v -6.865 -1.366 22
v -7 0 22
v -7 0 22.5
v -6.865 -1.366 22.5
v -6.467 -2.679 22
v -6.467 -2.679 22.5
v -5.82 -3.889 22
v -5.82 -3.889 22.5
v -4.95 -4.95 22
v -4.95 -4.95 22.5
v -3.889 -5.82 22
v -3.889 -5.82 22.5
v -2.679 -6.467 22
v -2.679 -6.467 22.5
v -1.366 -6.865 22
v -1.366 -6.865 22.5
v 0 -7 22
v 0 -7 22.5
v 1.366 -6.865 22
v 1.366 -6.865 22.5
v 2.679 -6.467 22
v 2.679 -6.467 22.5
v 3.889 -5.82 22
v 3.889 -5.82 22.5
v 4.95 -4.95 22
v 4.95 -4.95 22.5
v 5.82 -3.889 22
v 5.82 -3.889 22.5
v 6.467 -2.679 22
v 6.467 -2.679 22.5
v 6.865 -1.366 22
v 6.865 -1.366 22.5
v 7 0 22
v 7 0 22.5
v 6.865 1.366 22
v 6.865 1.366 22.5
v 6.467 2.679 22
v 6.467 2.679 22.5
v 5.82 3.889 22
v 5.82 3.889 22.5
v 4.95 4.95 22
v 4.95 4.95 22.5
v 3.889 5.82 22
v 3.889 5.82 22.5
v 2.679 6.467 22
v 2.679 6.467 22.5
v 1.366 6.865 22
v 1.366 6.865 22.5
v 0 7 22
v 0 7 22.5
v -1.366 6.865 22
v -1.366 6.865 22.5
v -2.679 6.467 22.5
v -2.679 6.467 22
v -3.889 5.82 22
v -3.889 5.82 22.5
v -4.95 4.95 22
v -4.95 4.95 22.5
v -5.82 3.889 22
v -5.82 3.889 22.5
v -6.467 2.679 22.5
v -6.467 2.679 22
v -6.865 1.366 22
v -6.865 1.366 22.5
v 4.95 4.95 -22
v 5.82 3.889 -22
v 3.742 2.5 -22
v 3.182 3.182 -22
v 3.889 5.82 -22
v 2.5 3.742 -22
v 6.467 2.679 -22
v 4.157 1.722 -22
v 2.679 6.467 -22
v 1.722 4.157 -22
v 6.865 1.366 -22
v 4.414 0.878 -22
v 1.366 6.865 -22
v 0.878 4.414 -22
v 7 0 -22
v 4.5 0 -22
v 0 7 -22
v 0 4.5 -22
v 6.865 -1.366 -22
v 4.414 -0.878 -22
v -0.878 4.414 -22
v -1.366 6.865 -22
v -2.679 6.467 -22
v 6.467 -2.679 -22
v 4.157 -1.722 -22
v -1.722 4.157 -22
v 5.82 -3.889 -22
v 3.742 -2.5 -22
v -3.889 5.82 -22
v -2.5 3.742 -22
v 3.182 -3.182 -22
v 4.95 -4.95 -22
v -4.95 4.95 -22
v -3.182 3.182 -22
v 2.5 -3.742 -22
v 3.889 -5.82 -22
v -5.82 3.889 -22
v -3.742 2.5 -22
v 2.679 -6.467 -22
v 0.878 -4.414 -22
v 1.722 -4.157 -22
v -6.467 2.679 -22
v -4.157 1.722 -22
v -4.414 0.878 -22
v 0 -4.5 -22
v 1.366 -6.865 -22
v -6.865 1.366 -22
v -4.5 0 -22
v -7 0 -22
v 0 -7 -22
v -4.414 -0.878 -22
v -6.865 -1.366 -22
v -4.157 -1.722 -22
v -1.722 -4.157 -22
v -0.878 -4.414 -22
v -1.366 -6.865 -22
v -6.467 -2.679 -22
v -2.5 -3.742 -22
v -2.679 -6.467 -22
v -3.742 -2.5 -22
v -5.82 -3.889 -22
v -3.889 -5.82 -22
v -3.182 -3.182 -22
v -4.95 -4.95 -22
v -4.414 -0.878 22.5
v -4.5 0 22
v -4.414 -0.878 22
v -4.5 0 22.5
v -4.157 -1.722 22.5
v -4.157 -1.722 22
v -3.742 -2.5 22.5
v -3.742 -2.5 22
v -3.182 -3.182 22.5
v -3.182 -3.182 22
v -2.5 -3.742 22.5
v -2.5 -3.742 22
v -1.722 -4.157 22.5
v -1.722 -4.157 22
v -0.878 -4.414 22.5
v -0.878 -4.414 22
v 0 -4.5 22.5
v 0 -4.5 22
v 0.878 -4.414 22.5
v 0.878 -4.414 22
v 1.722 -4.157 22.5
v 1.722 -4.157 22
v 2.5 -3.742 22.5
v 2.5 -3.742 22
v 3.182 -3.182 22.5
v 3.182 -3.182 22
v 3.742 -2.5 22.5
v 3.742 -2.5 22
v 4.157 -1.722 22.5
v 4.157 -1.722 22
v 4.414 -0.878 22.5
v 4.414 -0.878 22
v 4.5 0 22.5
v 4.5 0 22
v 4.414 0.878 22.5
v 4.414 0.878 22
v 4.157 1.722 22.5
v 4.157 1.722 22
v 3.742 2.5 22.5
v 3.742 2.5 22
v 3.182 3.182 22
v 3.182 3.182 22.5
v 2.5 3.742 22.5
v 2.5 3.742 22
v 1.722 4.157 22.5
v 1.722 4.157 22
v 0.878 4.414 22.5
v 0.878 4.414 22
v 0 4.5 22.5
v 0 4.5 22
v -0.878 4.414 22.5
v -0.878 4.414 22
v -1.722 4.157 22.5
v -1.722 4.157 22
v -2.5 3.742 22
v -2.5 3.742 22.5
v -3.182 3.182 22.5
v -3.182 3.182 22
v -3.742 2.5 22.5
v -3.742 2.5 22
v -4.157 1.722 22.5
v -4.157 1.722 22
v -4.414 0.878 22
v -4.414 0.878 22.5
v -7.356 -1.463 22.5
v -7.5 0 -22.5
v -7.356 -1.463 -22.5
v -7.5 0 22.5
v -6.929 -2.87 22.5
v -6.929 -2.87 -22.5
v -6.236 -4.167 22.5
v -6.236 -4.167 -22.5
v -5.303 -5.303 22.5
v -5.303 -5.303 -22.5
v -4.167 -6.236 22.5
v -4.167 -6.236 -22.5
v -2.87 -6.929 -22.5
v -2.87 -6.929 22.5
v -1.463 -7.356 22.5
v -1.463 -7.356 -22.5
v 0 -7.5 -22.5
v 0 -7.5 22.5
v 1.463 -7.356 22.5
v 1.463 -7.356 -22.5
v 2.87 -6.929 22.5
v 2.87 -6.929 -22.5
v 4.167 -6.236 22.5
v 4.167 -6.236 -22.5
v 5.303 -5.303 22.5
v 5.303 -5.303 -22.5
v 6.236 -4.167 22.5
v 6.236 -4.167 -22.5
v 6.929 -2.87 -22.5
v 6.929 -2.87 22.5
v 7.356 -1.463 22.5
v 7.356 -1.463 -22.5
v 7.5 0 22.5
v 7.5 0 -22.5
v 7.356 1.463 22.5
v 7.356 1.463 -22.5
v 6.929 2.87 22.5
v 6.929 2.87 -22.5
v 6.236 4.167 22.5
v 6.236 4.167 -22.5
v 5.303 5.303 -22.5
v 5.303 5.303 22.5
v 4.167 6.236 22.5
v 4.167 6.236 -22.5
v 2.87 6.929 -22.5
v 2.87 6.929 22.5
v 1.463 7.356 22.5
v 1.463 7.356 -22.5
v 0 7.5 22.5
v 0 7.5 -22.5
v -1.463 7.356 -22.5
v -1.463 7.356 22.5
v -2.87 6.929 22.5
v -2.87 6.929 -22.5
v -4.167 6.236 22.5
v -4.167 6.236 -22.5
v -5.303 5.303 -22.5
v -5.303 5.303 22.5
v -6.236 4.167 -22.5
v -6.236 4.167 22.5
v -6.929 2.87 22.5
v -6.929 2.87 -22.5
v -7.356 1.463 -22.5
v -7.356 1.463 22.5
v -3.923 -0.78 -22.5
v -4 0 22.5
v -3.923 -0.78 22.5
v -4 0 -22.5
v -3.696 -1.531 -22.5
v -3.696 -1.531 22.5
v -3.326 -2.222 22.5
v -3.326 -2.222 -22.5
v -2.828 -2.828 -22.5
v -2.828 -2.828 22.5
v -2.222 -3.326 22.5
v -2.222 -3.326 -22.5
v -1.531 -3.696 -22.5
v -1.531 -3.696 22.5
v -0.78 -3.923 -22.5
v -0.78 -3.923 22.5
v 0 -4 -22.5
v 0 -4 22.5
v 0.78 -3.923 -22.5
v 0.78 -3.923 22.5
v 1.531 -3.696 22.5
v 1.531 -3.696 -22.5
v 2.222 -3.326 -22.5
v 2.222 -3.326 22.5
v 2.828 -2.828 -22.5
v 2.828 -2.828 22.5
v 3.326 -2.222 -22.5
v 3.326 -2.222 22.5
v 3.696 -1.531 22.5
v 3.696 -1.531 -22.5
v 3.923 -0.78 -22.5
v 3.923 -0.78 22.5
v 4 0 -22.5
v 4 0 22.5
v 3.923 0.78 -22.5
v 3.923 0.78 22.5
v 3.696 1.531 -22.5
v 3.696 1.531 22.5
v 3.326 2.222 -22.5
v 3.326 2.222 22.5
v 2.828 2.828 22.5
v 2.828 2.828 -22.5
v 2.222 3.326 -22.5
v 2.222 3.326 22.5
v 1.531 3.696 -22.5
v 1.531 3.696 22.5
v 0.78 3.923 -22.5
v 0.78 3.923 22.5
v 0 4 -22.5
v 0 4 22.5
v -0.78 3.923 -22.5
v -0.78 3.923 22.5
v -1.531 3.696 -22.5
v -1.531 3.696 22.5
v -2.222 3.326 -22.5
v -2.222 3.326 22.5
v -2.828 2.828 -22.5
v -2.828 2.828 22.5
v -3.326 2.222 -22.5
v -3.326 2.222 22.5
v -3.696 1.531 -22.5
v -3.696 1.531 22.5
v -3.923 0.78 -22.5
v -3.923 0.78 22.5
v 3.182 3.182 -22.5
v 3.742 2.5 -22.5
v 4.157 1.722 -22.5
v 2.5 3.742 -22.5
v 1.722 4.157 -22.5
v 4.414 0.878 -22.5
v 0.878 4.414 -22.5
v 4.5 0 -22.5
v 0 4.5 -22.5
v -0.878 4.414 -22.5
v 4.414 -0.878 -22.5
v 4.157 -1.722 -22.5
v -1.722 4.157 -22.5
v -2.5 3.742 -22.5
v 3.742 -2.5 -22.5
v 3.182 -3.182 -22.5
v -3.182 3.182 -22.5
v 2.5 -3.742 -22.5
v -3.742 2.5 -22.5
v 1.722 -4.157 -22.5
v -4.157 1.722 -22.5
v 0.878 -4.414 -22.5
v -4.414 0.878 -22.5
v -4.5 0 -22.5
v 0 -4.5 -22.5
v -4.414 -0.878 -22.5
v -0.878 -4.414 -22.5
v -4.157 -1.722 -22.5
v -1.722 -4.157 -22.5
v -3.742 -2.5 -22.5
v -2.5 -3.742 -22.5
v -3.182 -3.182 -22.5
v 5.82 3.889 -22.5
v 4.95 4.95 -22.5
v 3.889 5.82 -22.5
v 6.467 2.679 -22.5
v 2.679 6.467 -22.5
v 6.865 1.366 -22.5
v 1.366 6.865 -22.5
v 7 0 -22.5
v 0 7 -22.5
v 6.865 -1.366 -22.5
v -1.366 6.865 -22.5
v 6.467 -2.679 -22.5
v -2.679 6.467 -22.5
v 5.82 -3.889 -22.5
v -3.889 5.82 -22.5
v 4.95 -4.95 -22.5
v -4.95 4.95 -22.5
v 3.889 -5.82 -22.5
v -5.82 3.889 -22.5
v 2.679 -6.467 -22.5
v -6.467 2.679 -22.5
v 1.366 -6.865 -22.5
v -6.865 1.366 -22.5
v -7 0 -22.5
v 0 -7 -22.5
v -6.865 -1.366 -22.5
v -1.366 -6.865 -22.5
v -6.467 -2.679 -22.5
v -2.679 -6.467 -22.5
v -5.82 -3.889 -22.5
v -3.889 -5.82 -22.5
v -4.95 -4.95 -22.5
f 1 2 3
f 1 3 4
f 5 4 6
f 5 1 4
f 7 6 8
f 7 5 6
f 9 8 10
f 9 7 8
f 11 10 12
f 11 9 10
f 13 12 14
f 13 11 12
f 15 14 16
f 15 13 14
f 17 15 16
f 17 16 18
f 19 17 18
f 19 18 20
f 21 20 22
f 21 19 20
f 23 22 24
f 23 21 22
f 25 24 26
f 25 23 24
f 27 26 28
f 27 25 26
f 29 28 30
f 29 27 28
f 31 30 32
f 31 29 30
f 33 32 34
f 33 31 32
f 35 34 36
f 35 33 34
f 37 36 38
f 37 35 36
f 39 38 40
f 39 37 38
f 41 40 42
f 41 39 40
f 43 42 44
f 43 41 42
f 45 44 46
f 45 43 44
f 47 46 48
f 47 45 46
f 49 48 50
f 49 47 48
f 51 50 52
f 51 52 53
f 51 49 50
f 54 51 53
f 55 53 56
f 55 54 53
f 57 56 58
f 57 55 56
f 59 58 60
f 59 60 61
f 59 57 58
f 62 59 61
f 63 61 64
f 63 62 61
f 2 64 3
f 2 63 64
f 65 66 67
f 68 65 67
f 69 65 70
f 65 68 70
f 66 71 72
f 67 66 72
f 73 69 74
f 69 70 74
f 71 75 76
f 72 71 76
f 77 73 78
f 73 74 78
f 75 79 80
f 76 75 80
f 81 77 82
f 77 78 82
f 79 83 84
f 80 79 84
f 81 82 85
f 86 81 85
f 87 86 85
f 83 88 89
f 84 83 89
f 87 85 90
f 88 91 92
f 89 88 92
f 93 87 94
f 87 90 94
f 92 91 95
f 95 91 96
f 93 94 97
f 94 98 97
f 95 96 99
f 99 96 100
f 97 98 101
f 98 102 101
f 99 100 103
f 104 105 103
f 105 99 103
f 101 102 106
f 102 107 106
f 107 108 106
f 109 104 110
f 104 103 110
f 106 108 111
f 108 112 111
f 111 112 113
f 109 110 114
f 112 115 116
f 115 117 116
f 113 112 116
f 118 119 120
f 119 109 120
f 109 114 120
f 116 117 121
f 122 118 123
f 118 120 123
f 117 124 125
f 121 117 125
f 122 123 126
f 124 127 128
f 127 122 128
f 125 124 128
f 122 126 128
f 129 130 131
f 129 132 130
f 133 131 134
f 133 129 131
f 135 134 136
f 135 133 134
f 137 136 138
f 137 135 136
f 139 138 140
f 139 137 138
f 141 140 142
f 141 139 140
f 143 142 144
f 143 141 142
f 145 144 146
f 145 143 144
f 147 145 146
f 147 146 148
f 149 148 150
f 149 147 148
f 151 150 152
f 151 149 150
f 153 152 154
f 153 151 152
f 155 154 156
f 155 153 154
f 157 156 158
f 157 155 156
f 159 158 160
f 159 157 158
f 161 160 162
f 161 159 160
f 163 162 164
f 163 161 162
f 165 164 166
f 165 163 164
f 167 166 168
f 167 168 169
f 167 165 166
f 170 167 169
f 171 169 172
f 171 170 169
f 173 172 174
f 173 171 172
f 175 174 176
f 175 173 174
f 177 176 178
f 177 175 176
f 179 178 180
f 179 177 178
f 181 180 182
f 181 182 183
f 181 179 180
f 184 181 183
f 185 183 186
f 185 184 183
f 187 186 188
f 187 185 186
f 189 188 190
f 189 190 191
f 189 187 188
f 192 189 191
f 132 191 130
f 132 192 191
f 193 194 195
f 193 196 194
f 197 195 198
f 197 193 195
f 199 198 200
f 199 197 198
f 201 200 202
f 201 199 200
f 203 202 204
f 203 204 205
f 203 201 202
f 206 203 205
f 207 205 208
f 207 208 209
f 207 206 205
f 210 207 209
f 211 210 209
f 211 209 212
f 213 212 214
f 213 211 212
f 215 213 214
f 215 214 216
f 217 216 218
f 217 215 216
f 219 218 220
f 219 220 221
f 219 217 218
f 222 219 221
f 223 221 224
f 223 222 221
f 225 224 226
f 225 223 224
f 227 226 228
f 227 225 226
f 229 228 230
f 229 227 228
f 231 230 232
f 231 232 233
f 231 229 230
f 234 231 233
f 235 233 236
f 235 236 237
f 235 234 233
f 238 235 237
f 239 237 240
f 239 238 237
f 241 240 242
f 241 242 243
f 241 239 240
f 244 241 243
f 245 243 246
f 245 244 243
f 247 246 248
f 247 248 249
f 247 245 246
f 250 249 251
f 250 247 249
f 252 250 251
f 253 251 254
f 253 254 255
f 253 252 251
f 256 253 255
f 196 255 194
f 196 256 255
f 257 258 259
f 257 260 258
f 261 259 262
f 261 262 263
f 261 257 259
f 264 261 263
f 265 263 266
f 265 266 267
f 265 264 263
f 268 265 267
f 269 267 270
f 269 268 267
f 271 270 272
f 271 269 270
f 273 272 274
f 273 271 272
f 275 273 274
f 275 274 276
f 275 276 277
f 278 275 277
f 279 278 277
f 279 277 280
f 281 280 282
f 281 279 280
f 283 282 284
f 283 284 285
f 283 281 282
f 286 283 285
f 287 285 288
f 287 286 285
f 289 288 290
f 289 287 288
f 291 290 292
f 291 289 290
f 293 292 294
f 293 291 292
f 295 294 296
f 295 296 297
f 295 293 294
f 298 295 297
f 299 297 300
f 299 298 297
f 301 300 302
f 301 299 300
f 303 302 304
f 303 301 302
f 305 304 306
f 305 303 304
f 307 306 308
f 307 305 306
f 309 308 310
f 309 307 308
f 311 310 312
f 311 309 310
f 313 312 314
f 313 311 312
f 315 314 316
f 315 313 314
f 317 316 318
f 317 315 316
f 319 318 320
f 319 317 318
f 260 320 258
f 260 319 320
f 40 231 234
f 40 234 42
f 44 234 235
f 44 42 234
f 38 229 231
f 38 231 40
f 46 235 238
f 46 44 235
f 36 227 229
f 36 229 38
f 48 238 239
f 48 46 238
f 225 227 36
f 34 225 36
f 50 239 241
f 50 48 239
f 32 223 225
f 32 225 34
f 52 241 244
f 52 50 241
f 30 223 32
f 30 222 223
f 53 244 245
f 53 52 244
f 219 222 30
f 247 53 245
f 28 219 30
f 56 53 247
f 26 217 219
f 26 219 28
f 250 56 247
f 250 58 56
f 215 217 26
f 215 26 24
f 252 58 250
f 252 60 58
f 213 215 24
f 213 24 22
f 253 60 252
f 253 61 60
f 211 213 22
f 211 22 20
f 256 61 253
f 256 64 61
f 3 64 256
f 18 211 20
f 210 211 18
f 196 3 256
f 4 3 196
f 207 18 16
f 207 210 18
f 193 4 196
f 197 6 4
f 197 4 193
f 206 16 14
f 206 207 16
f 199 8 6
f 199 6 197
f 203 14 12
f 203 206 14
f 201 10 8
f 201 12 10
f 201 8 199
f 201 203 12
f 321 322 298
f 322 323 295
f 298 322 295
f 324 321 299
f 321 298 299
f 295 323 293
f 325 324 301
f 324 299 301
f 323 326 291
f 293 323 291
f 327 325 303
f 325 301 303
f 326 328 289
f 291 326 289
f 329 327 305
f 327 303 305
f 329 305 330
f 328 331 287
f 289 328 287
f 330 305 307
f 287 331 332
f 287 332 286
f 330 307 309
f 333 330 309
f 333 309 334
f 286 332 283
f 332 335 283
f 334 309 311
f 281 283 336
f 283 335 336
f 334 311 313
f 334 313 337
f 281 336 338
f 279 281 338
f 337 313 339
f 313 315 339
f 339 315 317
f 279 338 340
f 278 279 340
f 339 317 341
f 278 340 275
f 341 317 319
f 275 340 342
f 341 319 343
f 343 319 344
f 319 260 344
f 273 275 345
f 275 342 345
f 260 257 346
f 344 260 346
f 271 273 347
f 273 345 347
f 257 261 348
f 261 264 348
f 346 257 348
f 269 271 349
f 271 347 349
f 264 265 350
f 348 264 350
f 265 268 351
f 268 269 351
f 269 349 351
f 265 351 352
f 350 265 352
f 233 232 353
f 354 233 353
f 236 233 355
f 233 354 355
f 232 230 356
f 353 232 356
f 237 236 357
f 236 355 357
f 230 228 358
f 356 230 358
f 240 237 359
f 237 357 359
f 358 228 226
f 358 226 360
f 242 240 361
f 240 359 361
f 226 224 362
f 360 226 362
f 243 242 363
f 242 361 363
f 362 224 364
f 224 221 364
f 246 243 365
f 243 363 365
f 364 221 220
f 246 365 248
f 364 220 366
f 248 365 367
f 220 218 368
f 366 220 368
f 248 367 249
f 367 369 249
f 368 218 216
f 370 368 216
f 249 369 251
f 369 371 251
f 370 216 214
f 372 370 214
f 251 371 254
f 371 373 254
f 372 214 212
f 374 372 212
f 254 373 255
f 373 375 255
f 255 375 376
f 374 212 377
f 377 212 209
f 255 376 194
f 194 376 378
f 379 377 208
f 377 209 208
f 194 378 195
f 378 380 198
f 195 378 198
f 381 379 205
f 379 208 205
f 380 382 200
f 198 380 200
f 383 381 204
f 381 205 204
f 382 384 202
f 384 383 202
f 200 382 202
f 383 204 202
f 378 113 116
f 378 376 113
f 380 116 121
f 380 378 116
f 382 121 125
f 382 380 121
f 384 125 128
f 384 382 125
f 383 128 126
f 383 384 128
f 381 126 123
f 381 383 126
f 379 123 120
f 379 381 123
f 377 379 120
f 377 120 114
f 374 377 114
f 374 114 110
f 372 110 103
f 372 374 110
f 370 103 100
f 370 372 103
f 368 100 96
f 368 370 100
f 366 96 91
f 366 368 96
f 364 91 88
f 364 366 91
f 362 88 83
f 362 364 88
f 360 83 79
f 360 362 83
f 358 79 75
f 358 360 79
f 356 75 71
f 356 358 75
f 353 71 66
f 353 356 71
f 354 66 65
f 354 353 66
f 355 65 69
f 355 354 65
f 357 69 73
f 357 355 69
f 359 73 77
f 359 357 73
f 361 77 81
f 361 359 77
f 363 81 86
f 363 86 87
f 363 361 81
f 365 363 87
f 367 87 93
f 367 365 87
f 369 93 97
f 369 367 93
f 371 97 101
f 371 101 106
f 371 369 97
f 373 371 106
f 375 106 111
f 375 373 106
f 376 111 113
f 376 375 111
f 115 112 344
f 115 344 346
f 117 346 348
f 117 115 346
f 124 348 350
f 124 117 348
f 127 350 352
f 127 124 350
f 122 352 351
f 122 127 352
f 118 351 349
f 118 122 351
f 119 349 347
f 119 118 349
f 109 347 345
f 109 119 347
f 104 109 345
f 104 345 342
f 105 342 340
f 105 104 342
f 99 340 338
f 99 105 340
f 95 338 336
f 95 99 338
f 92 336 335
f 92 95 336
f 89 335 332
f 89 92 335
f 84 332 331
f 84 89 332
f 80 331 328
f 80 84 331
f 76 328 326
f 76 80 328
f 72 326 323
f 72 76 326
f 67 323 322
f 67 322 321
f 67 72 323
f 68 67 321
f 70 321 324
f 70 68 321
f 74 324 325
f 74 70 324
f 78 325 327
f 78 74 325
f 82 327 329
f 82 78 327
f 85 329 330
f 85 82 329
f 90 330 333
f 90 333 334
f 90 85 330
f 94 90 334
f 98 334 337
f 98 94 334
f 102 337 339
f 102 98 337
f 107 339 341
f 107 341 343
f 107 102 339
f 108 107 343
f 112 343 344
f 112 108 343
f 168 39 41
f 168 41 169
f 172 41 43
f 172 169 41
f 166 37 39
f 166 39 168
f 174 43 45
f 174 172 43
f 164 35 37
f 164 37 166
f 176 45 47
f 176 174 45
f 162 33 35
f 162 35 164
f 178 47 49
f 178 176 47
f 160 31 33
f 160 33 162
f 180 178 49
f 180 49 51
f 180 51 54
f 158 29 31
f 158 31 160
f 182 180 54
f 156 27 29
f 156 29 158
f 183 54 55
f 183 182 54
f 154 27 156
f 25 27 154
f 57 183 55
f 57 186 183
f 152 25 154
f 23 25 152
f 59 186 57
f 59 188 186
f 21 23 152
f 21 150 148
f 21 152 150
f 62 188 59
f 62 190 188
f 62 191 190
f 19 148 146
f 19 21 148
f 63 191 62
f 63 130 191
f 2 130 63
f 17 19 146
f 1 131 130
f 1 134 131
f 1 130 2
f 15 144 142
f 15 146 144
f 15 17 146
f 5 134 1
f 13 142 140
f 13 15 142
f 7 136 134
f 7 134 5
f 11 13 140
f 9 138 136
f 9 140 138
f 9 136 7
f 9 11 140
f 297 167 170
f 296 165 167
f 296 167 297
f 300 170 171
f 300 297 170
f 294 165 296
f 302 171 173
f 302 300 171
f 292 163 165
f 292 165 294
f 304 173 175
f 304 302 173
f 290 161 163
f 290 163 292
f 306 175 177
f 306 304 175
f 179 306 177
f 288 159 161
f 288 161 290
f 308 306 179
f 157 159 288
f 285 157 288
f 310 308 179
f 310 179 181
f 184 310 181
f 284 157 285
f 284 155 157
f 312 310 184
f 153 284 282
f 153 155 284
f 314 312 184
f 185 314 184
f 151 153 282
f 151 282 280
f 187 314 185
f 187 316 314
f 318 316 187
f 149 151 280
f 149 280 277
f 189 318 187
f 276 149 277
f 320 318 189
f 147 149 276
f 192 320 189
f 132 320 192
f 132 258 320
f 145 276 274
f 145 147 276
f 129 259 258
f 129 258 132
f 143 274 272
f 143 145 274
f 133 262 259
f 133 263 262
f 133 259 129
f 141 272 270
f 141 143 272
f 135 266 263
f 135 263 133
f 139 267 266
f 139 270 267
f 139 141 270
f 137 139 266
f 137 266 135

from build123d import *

# Parameters (mm, degrees)
SKETCH_1_R        = 7.5
SKETCH_1_R_2      = 7
EXTRUDE_2_DEPTH   = 22.5
SKETCH_1_R_3      = 4.5
SKETCH_1_R_4      = 4
EXTRUDE_2_2_DEPTH = 22.5
SKETCH_1_5_R      = 7
SKETCH_1_5_R_2    = 4.5
EXTRUDE_3_DEPTH   = 22


with BuildPart() as part:
    # 草图1 → 凸台-拉伸2 (new, symmetric)
    with BuildSketch(Plane.XY):
        Circle(SKETCH_1_R)
        Circle(SKETCH_1_R_2, mode=Mode.SUBTRACT)
    extrude(amount=EXTRUDE_2_DEPTH, both=True)



with BuildPart() as body_2:
    # 草图1 → Extrude 2 2 (new, symmetric)
    with BuildSketch(Plane.XY):
        Circle(SKETCH_1_R_3)
        Circle(SKETCH_1_R_4, mode=Mode.SUBTRACT)
    extrude(amount=EXTRUDE_2_2_DEPTH, both=True)


with BuildPart() as part_1:
    add(part.part)

    add(body_2.part)  # 凸台-拉伸3 merges body 2
    # 草图1<5> → 凸台-拉伸3 (add, symmetric)
    with BuildSketch(Plane.XY):
        Circle(SKETCH_1_5_R)
        Circle(SKETCH_1_5_R_2, mode=Mode.SUBTRACT)
    extrude(amount=EXTRUDE_3_DEPTH, both=True)


solid = part_1.part
